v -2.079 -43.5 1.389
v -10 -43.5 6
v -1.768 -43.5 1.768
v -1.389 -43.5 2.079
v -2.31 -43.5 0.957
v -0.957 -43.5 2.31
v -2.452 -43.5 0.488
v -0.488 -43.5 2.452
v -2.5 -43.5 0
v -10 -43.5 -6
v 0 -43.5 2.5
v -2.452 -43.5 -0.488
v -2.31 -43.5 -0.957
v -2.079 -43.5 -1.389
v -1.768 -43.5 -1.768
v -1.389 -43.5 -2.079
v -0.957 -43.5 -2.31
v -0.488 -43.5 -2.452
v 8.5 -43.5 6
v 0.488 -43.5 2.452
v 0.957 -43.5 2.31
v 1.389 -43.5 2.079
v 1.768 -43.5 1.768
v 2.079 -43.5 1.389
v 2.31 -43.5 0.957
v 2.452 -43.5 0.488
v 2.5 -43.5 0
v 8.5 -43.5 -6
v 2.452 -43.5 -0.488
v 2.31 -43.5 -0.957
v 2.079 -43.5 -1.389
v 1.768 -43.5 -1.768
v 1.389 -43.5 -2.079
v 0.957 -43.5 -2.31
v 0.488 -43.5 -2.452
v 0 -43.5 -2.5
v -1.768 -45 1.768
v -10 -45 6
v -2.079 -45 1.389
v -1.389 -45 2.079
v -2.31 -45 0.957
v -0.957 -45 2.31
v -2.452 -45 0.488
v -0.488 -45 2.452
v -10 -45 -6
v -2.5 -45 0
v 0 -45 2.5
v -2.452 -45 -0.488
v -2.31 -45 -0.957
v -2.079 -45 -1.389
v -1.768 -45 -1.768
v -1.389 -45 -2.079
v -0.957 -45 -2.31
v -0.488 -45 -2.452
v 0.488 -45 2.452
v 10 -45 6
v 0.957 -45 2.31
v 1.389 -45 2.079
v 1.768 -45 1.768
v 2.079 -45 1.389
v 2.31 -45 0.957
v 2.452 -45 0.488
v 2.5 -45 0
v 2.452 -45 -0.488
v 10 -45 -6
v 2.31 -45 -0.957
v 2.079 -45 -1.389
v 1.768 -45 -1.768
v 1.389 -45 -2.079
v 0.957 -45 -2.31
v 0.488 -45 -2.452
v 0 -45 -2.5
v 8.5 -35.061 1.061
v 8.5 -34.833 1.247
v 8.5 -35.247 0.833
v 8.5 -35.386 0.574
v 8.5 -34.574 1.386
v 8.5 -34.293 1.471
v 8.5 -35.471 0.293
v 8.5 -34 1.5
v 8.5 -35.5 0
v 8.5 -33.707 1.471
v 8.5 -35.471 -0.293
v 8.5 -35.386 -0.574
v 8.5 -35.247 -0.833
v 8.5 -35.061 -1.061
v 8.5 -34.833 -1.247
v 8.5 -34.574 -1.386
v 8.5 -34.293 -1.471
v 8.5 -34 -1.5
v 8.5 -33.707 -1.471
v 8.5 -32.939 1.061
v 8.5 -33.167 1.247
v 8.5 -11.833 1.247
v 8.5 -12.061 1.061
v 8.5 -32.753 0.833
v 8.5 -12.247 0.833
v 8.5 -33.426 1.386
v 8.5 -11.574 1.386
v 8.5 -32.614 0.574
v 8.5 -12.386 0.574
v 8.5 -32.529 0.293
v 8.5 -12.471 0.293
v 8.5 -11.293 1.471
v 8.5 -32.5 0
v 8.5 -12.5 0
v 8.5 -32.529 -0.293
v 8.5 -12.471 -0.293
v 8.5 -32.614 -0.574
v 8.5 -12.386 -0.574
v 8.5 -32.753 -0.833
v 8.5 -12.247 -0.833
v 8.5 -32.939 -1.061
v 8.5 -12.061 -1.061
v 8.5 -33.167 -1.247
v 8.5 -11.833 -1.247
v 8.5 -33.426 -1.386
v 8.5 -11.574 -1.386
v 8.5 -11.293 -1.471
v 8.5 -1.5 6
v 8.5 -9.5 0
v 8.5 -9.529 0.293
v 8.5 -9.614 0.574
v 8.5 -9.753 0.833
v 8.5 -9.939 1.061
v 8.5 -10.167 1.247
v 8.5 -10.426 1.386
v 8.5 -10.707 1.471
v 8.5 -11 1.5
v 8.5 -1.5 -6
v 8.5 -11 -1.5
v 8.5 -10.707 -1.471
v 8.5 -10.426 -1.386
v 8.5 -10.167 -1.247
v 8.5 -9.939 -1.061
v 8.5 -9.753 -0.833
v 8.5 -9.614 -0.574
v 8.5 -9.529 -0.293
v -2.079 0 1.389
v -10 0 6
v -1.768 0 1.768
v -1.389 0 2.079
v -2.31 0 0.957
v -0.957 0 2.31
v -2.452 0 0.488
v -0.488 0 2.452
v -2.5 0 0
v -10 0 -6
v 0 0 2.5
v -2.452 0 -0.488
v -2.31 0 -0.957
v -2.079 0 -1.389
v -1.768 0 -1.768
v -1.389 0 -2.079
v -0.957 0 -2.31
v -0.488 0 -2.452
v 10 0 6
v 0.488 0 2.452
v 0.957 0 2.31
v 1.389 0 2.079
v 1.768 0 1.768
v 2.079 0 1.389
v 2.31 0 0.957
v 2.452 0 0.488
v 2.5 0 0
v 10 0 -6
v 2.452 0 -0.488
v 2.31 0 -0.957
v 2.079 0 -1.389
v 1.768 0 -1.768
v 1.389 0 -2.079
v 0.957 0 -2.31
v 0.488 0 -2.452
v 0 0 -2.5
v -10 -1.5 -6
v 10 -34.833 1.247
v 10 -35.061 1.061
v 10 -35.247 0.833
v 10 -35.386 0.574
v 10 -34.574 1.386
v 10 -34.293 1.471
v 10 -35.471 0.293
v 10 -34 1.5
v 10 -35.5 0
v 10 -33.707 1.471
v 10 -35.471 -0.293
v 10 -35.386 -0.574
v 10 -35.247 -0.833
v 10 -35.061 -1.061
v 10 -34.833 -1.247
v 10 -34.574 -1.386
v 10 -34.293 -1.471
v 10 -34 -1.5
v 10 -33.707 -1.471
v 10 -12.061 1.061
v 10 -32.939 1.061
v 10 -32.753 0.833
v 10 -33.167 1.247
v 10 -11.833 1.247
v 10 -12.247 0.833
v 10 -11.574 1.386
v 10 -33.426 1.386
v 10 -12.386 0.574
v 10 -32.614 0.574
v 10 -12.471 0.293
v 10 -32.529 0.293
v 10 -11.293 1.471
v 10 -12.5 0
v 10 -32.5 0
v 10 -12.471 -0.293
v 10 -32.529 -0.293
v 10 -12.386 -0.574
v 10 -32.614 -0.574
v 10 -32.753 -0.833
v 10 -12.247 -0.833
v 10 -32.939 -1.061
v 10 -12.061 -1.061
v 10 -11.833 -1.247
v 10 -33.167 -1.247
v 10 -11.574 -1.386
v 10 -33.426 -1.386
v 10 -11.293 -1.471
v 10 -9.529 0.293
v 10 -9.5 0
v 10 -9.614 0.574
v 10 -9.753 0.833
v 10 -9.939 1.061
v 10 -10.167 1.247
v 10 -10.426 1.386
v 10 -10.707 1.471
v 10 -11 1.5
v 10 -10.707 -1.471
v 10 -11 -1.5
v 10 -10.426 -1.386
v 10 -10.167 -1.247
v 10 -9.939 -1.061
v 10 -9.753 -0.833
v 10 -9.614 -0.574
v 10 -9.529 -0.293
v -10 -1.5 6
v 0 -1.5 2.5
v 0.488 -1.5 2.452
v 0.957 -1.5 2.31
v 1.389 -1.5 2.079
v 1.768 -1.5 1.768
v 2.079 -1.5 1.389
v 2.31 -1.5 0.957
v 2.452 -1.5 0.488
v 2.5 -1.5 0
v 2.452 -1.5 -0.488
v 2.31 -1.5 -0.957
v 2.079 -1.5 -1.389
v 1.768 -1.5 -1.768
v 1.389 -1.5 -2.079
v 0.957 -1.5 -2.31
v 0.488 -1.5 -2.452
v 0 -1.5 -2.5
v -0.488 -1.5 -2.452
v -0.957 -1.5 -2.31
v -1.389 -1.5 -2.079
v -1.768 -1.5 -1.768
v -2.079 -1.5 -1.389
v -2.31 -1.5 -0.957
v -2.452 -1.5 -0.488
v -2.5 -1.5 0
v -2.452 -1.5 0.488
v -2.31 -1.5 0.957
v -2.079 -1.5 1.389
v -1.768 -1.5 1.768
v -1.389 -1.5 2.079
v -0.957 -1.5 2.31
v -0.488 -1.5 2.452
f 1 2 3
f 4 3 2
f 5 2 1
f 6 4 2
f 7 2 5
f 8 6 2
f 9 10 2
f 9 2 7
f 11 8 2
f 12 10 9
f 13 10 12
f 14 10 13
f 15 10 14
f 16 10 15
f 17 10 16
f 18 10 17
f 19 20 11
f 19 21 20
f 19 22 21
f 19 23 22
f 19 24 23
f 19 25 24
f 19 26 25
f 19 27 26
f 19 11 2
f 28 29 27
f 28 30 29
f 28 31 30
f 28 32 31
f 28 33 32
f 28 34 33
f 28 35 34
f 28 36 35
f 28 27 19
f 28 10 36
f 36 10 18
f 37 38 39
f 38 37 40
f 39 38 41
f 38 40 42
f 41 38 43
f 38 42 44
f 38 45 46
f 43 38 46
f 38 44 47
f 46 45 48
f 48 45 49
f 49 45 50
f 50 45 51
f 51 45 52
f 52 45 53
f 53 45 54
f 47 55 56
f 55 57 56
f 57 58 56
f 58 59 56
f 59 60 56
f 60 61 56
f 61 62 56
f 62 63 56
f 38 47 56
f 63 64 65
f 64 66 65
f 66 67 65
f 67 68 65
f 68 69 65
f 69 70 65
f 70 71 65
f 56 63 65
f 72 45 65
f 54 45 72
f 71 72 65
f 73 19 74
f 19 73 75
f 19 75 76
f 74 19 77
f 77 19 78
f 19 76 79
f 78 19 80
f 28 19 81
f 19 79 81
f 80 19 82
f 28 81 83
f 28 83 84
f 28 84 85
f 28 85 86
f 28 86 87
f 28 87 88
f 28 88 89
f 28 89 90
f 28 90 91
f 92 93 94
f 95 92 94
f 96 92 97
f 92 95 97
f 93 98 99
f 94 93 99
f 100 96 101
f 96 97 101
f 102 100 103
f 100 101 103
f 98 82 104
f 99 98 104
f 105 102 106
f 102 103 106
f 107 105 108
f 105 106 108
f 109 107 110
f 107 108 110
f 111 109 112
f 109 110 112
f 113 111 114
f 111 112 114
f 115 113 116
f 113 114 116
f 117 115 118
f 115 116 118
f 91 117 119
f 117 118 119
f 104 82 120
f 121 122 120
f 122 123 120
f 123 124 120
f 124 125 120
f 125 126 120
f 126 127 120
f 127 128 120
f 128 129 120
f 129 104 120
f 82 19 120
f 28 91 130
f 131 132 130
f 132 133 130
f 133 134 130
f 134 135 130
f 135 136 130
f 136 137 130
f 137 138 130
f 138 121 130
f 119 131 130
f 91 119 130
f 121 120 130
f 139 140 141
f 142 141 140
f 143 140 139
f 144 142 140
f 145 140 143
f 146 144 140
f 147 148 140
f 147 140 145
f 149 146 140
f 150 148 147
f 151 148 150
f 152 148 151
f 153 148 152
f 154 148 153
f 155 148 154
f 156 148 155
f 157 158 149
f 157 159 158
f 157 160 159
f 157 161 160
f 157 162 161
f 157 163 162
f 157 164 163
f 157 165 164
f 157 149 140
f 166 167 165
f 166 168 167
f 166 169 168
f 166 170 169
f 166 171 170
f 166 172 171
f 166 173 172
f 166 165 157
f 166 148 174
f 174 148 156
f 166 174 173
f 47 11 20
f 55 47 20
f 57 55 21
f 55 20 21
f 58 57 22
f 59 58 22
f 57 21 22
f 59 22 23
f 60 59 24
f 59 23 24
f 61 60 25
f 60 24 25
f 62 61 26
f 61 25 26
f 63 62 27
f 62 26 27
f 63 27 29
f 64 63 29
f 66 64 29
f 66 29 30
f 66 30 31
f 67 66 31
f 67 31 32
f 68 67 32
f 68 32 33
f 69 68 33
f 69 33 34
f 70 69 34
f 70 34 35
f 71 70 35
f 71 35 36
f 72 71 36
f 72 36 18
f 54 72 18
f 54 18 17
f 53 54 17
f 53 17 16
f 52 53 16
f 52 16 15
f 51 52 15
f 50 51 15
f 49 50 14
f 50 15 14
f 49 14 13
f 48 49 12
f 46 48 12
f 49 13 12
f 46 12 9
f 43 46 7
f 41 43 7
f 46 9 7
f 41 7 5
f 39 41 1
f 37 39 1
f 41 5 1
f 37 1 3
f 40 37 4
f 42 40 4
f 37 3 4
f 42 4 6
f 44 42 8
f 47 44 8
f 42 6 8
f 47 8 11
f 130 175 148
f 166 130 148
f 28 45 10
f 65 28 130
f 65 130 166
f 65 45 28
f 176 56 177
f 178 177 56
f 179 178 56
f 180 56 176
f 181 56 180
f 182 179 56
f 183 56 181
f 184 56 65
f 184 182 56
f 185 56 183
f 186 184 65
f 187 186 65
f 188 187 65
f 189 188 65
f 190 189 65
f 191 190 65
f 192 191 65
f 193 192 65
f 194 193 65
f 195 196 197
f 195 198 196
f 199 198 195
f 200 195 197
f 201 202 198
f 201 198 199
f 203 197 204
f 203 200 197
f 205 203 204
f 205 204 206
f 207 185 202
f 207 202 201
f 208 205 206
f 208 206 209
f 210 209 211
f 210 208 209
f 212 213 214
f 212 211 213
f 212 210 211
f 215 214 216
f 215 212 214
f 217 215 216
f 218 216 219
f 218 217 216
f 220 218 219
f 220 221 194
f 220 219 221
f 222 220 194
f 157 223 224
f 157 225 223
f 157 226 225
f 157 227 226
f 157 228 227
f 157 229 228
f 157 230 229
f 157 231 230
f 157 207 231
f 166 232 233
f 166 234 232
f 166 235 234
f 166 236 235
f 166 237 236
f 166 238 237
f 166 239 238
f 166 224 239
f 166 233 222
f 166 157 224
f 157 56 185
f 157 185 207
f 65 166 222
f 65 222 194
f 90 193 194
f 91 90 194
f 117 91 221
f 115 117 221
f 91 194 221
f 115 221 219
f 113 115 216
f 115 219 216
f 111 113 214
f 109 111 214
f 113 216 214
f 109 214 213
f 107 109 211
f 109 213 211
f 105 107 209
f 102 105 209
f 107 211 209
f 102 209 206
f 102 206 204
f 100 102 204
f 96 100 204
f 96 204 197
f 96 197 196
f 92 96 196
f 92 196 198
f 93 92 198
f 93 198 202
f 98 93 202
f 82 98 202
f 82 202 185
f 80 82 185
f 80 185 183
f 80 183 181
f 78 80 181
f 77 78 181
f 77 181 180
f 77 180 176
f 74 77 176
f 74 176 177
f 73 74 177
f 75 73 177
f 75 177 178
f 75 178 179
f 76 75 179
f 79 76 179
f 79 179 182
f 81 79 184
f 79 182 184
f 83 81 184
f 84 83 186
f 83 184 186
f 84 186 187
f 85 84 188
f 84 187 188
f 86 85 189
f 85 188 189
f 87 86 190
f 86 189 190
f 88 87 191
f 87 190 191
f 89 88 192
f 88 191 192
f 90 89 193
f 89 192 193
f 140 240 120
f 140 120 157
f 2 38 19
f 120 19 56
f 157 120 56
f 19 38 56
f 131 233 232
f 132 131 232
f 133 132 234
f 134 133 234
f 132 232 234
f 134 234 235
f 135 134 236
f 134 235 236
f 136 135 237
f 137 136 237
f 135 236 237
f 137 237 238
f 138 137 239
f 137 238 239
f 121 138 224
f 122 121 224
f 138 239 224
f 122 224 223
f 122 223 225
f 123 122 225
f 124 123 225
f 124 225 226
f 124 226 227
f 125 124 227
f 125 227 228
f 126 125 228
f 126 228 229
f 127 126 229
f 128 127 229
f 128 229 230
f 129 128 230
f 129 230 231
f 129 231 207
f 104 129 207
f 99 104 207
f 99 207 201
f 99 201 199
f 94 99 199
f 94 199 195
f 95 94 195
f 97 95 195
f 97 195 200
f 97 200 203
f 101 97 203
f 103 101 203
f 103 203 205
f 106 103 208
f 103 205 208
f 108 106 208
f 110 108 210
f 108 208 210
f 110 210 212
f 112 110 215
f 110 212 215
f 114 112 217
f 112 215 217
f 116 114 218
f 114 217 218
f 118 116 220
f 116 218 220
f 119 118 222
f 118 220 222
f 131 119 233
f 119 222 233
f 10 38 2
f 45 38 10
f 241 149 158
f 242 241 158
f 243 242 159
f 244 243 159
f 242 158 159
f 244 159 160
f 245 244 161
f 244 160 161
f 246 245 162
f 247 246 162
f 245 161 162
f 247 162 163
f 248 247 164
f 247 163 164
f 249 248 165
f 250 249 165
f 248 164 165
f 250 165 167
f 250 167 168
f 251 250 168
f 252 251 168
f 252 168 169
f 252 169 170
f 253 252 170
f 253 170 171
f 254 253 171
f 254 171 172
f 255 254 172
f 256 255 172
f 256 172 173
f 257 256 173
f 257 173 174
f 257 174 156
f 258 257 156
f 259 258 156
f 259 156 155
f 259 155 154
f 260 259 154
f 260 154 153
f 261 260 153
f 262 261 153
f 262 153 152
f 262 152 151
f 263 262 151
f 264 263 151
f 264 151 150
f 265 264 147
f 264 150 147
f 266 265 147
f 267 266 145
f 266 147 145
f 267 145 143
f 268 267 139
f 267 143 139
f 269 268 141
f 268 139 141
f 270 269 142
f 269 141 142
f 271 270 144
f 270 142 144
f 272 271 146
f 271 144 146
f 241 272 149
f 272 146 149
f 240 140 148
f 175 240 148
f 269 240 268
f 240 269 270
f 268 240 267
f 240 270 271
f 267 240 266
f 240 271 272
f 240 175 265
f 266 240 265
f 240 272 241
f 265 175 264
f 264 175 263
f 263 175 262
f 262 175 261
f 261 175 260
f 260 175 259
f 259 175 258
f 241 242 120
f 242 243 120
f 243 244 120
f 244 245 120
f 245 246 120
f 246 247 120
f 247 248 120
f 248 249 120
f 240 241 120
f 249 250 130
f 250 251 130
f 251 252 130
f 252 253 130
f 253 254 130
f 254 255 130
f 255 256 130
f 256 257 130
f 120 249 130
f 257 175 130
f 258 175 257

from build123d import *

# Parameters (mm, degrees)
SKETCH1_W           = 18.5
SKETCH1_H           = 12
BOSS_EXTRUDE1_DEPTH = 1.5
SKETCH1_3_W         = 1.5
SKETCH1_3_H         = 12
BOSS_EXTRUDE2_DEPTH = 45
SKETCH2_R           = 1.5
CUT_EXTRUDE1_DEPTH  = 50.608467019
BOSS_EXTRUDE3_START = -45
SKETCH1_4_W         = 18.5
SKETCH1_4_H         = 12
BOSS_EXTRUDE3_DEPTH = 1.5
SKETCH3_R           = 2.5
CUT_EXTRUDE2_DEPTH  = 47.486557197


with BuildPart() as part:
    # Sketch1 → Boss-Extrude1 (new body)
    with BuildSketch(Plane(origin=(0, 0, 0), x_dir=(1, 0, 0), z_dir=(0, 1, 0))):
        with Locations((-0.75, 0)):
            Rectangle(SKETCH1_W, SKETCH1_H)
    extrude(amount=-BOSS_EXTRUDE1_DEPTH)

    # Sketch1<3> → Boss-Extrude2 (add)
    with BuildSketch(Plane(origin=(0, 0, 0), x_dir=(1, 0, 0), z_dir=(0, 1, 0))):
        with Locations((9.25, 0)):
            Rectangle(SKETCH1_3_W, SKETCH1_3_H)
    extrude(amount=-BOSS_EXTRUDE2_DEPTH)

    # Sketch2 → Cut-Extrude1 (cut, through all)
    with BuildSketch(Plane(origin=(10, 0, 0), x_dir=(0, 0, -1), z_dir=(1, 0, 0))):
        with Locations((0, -34)):
            Circle(SKETCH2_R)
        with Locations((0, -11)):
            Circle(SKETCH2_R)
    extrude(amount=-CUT_EXTRUDE1_DEPTH, mode=Mode.SUBTRACT)

    # Sketch1<4> → Boss-Extrude3 (add)
    with BuildSketch(Plane(origin=(0, 0, 0), x_dir=(1, 0, 0), z_dir=(0, 1, 0)).offset(BOSS_EXTRUDE3_START)):
        with Locations((-0.75, 0)):
            Rectangle(SKETCH1_4_W, SKETCH1_4_H)
    extrude(amount=BOSS_EXTRUDE3_DEPTH)

    # Sketch3 → Cut-Extrude2 (cut, through all)
    with BuildSketch(Plane(origin=(0, 0, 0), x_dir=(1, 0, 0), z_dir=(0, 1, 0))):
        with Locations(Location((0, 0, 0), (0, 0, 270))):
            Circle(SKETCH3_R)
    extrude(amount=-CUT_EXTRUDE2_DEPTH, mode=Mode.SUBTRACT)


solid = part.part
